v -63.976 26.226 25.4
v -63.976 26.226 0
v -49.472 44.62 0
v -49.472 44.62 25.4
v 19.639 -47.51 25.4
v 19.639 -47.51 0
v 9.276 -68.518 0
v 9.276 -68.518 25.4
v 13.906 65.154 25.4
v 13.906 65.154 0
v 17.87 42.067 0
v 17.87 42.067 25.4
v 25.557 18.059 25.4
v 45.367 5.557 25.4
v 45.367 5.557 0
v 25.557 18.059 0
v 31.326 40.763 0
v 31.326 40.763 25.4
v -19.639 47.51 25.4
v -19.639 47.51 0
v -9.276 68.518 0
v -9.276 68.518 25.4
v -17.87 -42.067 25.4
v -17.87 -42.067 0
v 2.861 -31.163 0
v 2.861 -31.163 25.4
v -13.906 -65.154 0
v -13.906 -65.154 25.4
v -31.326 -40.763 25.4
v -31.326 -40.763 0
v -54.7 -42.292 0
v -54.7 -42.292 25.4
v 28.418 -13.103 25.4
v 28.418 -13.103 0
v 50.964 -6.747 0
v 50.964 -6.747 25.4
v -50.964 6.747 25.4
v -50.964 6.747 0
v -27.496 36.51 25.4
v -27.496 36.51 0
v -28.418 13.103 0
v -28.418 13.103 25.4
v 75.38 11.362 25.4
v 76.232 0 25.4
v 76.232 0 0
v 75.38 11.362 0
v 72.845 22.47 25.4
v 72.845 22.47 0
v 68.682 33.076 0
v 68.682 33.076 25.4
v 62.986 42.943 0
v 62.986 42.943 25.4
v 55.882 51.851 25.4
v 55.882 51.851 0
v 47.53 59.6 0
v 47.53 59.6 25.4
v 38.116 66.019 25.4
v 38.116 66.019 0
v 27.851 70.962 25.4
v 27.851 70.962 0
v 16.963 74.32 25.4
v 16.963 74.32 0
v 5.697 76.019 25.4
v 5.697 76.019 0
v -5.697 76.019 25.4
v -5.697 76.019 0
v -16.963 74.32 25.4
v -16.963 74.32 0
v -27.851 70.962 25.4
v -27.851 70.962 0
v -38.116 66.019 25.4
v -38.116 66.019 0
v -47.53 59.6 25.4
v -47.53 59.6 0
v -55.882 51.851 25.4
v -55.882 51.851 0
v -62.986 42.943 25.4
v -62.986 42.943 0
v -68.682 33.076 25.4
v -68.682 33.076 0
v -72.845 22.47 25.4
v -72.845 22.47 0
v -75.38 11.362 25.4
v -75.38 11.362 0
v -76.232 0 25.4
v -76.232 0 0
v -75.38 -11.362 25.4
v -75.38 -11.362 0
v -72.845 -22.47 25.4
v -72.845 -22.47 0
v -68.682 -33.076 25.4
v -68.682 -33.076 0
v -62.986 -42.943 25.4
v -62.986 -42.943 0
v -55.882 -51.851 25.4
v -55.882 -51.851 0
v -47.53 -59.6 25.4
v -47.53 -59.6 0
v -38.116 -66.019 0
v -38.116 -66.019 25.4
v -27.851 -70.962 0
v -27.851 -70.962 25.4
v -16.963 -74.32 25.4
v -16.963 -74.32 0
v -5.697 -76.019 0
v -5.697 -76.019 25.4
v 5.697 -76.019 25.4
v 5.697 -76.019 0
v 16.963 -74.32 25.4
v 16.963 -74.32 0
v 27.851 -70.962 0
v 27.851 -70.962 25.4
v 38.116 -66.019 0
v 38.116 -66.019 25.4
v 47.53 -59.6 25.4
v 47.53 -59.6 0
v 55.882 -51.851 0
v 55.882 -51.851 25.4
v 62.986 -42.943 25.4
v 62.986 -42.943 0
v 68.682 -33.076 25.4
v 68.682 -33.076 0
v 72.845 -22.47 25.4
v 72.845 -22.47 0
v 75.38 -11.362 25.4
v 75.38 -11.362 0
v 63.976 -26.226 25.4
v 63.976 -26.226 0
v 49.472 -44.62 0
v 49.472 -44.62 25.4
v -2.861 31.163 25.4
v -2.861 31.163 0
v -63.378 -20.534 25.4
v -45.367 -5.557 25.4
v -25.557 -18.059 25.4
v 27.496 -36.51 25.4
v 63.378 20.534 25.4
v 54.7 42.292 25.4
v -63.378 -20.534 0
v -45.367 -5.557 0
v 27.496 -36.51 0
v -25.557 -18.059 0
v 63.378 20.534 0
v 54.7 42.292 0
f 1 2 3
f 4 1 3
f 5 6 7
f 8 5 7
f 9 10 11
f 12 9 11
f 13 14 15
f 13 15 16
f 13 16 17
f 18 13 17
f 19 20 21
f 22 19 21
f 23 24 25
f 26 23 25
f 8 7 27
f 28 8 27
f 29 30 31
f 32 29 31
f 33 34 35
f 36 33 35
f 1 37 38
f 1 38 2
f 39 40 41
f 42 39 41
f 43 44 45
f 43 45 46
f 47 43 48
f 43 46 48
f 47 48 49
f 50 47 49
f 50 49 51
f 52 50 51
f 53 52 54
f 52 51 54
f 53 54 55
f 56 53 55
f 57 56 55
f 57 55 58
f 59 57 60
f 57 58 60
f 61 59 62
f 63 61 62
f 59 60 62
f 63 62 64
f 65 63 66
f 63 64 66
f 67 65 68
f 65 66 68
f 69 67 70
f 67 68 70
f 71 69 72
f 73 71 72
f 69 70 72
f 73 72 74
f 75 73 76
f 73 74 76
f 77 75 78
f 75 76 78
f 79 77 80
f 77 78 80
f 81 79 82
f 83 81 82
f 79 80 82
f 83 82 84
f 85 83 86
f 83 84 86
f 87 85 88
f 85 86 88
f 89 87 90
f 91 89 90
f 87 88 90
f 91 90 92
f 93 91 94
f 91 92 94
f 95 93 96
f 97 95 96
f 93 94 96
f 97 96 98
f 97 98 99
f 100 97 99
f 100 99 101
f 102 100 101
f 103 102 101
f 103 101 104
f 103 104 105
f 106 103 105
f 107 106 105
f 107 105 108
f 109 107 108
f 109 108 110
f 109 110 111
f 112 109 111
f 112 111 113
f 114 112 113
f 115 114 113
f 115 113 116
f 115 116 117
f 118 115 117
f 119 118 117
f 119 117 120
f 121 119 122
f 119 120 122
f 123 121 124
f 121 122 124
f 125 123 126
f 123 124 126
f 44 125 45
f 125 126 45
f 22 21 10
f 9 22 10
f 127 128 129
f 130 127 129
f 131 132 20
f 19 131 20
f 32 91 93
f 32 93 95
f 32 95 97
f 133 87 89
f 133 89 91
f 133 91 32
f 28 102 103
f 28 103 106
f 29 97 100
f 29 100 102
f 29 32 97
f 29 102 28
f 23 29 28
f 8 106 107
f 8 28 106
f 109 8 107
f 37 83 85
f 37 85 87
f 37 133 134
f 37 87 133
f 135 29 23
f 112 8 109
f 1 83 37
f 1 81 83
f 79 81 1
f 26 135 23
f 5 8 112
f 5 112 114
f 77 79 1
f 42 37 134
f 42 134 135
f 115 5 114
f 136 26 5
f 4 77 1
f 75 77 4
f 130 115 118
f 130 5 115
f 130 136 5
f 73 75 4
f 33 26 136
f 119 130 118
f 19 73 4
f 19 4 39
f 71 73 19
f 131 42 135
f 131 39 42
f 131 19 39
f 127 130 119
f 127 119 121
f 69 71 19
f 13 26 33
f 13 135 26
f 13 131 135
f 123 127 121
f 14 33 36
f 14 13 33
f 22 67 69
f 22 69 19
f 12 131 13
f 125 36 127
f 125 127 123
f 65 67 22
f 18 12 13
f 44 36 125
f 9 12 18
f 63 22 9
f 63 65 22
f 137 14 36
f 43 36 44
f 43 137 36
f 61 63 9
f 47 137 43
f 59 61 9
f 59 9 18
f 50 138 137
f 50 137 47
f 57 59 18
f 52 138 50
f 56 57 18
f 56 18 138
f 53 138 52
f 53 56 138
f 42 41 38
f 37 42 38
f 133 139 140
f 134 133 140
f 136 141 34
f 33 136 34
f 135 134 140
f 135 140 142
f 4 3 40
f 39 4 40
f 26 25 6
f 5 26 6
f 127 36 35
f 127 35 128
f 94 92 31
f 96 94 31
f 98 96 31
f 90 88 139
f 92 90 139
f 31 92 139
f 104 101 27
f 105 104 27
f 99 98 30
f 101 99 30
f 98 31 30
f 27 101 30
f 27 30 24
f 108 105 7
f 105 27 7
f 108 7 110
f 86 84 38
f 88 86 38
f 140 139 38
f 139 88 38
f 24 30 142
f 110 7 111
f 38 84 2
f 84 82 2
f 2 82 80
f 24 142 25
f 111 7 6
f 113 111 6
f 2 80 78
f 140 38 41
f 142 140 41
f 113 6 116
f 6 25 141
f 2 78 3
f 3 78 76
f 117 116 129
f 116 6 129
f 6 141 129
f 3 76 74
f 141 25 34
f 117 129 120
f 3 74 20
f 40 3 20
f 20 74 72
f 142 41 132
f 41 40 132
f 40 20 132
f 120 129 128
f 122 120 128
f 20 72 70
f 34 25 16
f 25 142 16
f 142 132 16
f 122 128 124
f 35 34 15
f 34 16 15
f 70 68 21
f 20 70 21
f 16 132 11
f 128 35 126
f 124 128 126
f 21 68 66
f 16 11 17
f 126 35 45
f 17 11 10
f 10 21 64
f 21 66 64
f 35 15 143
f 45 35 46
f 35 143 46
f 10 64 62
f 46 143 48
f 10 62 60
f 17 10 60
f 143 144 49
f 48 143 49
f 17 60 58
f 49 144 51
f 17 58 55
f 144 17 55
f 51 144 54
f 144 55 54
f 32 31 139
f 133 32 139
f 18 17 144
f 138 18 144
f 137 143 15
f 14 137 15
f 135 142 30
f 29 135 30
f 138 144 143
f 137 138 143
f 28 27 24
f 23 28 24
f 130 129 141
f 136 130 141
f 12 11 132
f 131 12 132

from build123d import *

# Parameters (mm, degrees)
F0_R     = 76.231661
F1_DEPTH = 25.4


with BuildPart() as f1:
    # F0 (on Top) → F1 (new body)
    with BuildSketch(Plane.XY):
        Circle(F0_R)
        Polygon((-54.700378, -42.292298), (-63.378183, -20.53418), (-45.366573, -5.557469), (-25.55698, -18.05947), (-31.325589, -40.762842), align=None, mode=Mode.SUBTRACT)
        Polygon((9.276015, -68.518065), (-13.90597, -65.154207), (-17.870377, -42.067339), (2.861469, -31.162729), (19.638862, -47.510177), align=None, mode=Mode.SUBTRACT)
        Polygon((63.976393, -26.225768), (49.472213, -44.620026), (27.496196, -36.50987), (28.41845, -13.10326), (50.964451, -6.747335), align=None, mode=Mode.SUBTRACT)
        Polygon((-63.976393, 26.225768), (-49.472213, 44.620026), (-27.496196, 36.50987), (-28.41845, 13.10326), (-50.964451, 6.747335), align=None, mode=Mode.SUBTRACT)
        Polygon((-2.861469, 31.162729), (-19.638862, 47.510177), (-9.276015, 68.518065), (13.90597, 65.154207), (17.870377, 42.067339), align=None, mode=Mode.SUBTRACT)
        Polygon((54.700378, 42.292298), (63.378183, 20.53418), (45.366573, 5.557469), (25.55698, 18.05947), (31.325589, 40.762842), align=None, mode=Mode.SUBTRACT)
    extrude(amount=F1_DEPTH)


solid = f1.part
